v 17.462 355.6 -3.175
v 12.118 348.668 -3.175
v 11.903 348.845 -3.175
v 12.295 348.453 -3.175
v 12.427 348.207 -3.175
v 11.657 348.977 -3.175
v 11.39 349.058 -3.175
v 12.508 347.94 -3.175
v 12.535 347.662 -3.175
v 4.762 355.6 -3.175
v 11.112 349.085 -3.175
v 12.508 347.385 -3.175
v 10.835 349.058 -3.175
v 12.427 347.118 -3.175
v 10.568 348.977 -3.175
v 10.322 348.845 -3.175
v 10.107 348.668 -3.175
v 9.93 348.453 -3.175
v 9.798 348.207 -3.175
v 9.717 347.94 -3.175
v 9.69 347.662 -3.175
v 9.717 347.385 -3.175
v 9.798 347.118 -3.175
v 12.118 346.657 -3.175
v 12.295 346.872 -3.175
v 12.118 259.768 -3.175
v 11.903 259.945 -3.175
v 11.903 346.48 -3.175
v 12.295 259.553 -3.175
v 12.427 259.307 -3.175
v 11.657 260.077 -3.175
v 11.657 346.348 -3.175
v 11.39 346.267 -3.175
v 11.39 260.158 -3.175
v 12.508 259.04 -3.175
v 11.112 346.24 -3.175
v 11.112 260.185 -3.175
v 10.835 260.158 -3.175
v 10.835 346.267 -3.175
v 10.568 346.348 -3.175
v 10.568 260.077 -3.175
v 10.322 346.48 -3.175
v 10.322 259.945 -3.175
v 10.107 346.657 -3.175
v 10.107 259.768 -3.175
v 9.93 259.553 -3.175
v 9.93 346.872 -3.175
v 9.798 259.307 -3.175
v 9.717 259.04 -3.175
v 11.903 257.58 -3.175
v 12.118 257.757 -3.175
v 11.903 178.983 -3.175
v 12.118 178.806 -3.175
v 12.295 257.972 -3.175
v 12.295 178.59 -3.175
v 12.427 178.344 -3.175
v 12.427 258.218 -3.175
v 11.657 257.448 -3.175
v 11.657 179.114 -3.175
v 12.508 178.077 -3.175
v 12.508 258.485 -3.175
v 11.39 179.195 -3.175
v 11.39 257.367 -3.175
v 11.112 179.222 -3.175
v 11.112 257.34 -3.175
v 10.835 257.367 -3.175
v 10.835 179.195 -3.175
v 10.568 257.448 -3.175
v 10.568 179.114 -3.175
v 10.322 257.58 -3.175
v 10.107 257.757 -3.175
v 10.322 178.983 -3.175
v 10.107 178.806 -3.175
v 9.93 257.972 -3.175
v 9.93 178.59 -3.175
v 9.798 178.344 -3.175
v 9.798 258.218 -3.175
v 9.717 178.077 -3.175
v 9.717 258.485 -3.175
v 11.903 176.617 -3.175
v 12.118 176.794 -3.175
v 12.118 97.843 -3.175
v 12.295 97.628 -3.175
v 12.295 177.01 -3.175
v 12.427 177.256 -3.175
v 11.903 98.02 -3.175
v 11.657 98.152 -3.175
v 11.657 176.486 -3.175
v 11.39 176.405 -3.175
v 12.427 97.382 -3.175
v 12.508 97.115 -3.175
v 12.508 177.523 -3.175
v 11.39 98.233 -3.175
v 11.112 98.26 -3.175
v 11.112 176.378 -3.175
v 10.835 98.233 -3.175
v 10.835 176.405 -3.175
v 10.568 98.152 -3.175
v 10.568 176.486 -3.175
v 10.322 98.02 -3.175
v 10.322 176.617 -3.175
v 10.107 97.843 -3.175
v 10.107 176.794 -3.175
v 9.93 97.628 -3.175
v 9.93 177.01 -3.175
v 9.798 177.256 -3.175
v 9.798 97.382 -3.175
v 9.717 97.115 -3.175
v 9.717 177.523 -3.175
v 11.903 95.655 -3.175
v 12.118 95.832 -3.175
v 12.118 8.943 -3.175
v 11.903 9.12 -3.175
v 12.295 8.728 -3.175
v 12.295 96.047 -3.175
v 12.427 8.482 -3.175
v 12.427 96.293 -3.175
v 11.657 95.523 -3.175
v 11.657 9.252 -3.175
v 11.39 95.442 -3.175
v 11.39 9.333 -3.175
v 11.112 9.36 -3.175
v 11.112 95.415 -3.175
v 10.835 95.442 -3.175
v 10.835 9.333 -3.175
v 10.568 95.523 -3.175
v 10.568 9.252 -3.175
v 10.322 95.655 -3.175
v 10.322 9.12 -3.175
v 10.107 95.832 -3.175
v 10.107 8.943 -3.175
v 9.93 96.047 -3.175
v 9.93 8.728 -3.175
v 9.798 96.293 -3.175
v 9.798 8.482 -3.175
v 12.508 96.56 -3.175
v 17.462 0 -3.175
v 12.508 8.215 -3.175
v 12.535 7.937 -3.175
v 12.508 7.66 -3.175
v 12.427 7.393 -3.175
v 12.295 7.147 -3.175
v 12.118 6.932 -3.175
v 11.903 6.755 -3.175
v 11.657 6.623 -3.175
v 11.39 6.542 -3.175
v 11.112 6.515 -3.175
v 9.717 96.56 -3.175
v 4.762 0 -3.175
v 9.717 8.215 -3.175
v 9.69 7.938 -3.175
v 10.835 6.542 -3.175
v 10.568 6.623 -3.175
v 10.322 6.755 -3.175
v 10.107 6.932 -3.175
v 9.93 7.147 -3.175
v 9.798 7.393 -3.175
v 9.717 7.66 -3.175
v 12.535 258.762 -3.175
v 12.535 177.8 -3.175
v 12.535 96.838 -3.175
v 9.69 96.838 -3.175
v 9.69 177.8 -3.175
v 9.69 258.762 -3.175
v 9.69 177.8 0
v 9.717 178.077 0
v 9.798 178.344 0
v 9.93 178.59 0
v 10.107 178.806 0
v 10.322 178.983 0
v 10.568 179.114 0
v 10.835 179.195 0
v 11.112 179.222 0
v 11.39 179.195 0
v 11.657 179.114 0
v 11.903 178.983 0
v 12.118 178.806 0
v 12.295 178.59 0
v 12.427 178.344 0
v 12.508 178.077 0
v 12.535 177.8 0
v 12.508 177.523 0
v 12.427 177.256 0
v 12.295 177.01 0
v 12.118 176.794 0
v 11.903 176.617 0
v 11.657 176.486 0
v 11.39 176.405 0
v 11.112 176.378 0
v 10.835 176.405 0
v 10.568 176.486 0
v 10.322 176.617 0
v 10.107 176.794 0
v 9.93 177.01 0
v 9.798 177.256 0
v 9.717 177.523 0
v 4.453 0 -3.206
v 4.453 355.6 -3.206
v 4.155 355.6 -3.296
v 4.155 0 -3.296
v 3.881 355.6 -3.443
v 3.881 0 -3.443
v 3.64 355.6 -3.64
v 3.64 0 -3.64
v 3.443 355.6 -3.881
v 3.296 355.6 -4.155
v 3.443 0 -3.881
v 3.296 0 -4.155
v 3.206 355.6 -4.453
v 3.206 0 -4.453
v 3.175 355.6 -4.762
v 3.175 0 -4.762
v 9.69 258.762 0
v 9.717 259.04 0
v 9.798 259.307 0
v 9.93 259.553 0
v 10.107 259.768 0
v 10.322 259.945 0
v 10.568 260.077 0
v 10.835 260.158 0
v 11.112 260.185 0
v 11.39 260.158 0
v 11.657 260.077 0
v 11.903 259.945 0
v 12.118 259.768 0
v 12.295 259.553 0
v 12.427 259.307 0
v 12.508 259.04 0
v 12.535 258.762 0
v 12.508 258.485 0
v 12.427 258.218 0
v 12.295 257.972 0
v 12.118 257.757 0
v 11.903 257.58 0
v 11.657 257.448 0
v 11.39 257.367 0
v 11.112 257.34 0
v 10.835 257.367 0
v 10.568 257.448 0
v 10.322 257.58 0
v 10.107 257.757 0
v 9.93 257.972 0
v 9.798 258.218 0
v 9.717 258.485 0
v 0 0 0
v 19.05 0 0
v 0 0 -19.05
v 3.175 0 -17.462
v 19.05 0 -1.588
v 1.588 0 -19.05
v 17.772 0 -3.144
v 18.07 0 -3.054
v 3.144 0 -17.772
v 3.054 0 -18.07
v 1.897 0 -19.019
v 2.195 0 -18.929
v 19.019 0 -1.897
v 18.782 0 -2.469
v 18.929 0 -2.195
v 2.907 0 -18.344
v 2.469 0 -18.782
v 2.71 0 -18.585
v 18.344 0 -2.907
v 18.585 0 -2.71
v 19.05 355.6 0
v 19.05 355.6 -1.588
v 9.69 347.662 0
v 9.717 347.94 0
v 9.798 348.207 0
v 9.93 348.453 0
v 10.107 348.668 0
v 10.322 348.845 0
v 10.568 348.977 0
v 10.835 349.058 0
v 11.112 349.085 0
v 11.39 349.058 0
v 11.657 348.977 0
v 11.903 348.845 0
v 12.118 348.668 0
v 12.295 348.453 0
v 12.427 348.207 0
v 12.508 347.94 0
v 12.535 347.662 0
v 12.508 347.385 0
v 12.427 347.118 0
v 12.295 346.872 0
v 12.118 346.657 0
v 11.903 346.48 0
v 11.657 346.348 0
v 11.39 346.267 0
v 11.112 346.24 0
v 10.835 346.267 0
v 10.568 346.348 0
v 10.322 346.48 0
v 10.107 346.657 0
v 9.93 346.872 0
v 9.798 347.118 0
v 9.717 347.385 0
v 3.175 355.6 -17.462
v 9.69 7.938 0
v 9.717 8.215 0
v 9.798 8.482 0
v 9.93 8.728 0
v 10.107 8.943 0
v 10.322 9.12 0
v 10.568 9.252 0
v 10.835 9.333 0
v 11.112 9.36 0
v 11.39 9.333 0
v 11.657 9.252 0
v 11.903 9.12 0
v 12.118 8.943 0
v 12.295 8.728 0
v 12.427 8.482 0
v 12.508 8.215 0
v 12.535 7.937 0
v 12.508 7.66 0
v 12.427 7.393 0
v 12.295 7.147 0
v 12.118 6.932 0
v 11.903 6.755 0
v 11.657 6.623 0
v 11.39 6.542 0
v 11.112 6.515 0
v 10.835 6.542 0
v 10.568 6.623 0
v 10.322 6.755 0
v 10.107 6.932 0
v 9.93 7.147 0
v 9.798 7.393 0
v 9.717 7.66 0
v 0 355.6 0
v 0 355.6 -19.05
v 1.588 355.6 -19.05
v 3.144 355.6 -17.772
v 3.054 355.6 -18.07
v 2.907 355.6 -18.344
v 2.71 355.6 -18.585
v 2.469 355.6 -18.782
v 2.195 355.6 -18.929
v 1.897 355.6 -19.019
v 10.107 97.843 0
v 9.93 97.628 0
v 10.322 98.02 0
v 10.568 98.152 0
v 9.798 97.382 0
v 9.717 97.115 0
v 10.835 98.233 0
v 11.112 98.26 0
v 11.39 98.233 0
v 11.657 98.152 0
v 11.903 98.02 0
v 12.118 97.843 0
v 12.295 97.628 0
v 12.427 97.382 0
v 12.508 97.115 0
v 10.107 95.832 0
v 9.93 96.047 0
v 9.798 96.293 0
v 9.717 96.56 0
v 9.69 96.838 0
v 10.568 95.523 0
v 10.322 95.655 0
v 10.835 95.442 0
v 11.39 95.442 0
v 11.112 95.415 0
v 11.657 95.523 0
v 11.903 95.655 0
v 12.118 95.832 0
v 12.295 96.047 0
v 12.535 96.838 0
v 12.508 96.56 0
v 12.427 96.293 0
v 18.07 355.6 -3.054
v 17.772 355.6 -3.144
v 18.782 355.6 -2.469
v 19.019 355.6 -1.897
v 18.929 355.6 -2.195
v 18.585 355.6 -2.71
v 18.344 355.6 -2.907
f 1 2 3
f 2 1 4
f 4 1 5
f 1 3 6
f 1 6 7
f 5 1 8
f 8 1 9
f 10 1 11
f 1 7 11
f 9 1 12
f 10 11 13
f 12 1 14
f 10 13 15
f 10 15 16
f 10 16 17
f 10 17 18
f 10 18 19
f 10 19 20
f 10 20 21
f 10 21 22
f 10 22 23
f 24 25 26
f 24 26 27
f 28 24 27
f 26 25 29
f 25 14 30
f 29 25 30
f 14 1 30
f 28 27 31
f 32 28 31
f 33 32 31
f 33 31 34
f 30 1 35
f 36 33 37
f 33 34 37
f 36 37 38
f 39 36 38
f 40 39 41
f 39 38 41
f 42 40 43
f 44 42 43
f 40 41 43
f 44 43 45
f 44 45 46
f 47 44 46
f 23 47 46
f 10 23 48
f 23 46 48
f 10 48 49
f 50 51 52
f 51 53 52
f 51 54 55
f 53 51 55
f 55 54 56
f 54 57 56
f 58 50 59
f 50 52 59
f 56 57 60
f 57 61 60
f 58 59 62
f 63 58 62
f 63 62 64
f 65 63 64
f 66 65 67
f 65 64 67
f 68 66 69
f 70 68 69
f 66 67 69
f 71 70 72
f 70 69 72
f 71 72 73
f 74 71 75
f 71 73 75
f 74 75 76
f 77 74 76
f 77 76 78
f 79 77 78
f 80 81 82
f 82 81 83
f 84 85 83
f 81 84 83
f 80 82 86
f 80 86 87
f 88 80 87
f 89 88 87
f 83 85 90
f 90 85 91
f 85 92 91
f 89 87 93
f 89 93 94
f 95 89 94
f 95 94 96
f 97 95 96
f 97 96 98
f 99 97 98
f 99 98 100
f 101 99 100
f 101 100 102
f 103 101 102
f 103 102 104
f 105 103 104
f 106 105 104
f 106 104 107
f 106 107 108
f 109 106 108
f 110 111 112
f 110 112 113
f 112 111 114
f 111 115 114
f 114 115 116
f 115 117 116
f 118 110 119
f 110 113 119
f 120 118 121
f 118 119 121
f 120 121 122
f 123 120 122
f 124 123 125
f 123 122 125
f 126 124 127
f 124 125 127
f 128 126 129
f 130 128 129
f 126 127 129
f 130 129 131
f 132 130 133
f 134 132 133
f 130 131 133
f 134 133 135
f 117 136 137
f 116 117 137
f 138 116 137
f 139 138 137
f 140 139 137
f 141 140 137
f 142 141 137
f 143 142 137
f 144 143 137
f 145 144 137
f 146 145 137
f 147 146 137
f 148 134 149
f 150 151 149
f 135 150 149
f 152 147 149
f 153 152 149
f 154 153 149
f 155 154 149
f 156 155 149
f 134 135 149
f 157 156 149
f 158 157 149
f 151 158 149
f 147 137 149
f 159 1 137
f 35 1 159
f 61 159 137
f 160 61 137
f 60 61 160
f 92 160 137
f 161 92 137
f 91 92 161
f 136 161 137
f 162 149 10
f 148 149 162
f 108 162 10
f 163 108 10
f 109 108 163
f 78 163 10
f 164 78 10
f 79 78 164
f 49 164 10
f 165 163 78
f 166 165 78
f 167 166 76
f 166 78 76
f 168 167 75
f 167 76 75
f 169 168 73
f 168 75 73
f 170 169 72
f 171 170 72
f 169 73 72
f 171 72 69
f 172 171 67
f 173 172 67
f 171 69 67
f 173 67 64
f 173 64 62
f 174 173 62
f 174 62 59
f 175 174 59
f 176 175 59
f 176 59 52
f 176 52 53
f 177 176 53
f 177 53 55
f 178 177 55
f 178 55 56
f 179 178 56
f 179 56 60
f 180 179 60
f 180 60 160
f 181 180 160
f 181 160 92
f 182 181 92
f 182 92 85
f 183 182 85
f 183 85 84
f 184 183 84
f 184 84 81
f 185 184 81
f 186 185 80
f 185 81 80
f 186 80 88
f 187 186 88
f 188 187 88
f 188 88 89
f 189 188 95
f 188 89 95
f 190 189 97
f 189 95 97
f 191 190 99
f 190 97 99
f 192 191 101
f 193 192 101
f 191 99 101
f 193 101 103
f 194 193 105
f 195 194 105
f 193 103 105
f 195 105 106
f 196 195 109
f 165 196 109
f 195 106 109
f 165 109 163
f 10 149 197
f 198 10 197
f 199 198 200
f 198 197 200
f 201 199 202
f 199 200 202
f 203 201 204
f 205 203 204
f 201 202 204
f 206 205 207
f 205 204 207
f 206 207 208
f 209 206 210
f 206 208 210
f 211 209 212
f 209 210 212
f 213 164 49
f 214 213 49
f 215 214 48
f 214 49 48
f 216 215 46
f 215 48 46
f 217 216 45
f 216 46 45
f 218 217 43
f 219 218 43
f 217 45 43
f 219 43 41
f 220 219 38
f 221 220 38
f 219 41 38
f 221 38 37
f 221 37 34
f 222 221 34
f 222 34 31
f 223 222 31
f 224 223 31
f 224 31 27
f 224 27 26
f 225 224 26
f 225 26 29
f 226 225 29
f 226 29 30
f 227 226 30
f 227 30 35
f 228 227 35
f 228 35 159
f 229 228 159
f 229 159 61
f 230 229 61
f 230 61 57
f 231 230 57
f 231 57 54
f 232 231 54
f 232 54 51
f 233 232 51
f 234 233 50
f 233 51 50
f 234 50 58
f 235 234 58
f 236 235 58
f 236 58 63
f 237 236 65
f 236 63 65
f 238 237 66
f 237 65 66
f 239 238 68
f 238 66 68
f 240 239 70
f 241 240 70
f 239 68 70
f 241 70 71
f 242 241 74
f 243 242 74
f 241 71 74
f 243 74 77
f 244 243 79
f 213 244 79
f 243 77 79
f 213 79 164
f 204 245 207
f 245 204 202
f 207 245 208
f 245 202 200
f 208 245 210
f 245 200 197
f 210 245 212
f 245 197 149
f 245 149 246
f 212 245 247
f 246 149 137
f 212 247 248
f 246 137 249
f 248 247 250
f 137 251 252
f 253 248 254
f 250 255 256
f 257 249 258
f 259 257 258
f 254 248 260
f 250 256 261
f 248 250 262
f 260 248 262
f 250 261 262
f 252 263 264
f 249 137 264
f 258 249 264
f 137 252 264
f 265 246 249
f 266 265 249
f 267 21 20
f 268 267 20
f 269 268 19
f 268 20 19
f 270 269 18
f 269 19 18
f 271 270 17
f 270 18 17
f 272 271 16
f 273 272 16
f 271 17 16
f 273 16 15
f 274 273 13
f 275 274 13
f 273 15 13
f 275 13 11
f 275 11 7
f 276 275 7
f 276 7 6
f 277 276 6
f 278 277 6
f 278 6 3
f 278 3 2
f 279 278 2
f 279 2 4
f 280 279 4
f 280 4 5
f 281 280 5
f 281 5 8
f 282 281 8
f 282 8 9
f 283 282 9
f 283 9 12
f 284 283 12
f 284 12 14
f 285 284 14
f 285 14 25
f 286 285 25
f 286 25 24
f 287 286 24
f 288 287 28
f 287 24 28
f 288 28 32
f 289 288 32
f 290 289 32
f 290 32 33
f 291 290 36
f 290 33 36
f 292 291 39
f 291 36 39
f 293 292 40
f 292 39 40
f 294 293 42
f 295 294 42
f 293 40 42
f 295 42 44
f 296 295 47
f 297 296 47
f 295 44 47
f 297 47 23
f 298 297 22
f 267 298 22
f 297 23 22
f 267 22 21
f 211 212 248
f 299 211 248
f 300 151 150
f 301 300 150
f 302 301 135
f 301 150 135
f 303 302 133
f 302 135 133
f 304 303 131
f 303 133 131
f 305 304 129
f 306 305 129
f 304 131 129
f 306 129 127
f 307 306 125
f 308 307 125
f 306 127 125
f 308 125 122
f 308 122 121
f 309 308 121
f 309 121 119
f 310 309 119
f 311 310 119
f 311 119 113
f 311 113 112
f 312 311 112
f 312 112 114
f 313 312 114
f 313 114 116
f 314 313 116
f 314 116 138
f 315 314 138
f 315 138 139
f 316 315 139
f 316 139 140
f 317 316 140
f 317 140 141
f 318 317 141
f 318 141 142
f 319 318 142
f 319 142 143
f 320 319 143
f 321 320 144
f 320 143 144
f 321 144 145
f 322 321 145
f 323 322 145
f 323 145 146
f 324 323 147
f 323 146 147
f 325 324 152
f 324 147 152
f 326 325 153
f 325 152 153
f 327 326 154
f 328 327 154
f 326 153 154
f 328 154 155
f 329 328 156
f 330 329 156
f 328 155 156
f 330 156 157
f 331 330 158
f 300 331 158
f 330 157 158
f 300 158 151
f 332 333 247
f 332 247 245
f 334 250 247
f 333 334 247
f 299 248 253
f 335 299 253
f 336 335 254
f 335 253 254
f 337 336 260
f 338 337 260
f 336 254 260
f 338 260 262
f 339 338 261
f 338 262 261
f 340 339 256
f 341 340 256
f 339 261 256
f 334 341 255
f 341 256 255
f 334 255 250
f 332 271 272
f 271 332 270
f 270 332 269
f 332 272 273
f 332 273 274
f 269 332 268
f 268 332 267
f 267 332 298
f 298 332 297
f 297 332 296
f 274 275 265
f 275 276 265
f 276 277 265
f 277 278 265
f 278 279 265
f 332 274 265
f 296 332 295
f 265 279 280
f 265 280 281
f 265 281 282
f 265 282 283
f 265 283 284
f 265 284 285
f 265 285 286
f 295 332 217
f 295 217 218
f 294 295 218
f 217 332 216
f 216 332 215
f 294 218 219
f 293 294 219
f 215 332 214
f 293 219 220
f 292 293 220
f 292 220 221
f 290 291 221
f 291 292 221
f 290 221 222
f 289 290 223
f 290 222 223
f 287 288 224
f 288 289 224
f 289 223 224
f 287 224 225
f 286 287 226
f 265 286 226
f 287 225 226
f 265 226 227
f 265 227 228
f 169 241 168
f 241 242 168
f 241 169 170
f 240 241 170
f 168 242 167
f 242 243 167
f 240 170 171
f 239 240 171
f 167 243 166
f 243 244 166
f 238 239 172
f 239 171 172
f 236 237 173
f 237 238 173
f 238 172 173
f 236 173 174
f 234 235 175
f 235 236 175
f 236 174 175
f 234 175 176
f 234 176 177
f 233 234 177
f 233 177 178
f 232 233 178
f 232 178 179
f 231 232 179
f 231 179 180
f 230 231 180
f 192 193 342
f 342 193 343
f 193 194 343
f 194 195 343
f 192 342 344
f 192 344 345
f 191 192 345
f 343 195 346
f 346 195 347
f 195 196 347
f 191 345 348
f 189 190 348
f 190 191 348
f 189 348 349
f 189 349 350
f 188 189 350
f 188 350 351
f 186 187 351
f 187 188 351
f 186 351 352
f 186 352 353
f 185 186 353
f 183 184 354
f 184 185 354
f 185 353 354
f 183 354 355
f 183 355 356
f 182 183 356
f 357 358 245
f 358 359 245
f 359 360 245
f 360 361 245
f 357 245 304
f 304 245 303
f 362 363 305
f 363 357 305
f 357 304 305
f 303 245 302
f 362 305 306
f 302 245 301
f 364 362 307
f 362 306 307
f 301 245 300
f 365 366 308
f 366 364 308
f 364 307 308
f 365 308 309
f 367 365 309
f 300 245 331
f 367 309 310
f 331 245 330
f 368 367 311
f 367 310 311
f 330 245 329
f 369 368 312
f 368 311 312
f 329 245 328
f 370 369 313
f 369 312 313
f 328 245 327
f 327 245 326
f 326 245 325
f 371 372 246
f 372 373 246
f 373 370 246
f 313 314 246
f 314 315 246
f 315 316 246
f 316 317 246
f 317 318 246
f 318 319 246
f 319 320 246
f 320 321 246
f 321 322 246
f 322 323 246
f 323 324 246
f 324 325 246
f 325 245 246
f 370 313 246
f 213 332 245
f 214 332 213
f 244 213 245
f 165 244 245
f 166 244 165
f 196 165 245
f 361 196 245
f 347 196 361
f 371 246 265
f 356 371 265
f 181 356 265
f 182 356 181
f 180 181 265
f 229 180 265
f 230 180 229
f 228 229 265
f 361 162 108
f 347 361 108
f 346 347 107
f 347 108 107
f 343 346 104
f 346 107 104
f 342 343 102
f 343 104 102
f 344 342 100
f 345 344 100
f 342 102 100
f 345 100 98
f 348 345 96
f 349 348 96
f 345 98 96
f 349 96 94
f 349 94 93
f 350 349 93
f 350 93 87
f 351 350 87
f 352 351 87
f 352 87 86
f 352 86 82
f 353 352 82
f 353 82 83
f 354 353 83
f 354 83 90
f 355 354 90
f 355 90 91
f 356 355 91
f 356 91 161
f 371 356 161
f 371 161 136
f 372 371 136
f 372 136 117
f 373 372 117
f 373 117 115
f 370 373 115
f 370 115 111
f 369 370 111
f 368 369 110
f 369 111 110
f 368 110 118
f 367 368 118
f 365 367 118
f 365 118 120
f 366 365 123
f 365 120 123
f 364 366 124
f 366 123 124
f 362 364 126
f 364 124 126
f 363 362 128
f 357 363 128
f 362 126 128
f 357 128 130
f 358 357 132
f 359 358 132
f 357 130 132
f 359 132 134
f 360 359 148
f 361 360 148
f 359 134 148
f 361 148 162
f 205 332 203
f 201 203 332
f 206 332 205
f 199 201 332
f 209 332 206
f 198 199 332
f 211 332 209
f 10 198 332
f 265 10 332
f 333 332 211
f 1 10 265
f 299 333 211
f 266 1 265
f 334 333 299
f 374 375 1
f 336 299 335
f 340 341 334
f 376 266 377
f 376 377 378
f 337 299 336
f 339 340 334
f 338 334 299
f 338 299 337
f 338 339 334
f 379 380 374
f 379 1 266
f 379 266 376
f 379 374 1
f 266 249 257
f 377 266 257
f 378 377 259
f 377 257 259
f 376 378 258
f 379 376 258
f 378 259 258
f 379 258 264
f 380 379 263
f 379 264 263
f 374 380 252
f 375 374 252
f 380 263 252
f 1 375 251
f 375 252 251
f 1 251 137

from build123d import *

# Parameters (mm, degrees)
BOSS_EXTRUDE1_DEPTH = 355.6
SKETCH3_R           = 1.4224
CUT_EXTRUDE1_DEPTH  = 5.08


with BuildPart() as part:
    # Sketch2 → Boss-Extrude1 (new body)
    with BuildSketch(Plane(origin=(0, 0, 0), x_dir=(1, 0, 0), z_dir=(0, 1, 0))):
        with BuildLine():
            Line((0, 0), (19.05, 0))
            Line((19.05, 0), (19.05, 1.5875))
            ThreePointArc((19.05, 1.5875), (18.585032015, 2.710032015), (17.4625, 3.175))
            Line((17.4625, 3.175), (4.7625, 3.175))
            ThreePointArc((4.7625, 3.175), (3.639967985, 3.639967985), (3.175, 4.7625))
            Line((3.175, 4.7625), (3.175, 17.4625))
            ThreePointArc((3.175, 17.4625), (2.710032015, 18.585032015), (1.5875, 19.05))
            Line((1.5875, 19.05), (0, 19.05))
            Line((0, 19.05), (0, 0))
        make_face()
    extrude(amount=BOSS_EXTRUDE1_DEPTH)

    # Sketch3 → Cut-Extrude1 (cut)
    with BuildSketch(Plane(origin=(0, 0, -3.175), x_dir=(-1, 0, 0), z_dir=(0, 0, -1))):
        with Locations((-11.1125, 7.9375)):
            Circle(SKETCH3_R)
        with Locations((-11.1125, 347.6625)):
            Circle(SKETCH3_R)
        with Locations((-11.1125, 96.8375)):
            Circle(SKETCH3_R)
        with Locations((-11.1125, 177.8)):
            Circle(SKETCH3_R)
        with Locations((-11.1125, 258.7625)):
            Circle(SKETCH3_R)
    extrude(amount=-CUT_EXTRUDE1_DEPTH, mode=Mode.SUBTRACT)


solid = part.part
